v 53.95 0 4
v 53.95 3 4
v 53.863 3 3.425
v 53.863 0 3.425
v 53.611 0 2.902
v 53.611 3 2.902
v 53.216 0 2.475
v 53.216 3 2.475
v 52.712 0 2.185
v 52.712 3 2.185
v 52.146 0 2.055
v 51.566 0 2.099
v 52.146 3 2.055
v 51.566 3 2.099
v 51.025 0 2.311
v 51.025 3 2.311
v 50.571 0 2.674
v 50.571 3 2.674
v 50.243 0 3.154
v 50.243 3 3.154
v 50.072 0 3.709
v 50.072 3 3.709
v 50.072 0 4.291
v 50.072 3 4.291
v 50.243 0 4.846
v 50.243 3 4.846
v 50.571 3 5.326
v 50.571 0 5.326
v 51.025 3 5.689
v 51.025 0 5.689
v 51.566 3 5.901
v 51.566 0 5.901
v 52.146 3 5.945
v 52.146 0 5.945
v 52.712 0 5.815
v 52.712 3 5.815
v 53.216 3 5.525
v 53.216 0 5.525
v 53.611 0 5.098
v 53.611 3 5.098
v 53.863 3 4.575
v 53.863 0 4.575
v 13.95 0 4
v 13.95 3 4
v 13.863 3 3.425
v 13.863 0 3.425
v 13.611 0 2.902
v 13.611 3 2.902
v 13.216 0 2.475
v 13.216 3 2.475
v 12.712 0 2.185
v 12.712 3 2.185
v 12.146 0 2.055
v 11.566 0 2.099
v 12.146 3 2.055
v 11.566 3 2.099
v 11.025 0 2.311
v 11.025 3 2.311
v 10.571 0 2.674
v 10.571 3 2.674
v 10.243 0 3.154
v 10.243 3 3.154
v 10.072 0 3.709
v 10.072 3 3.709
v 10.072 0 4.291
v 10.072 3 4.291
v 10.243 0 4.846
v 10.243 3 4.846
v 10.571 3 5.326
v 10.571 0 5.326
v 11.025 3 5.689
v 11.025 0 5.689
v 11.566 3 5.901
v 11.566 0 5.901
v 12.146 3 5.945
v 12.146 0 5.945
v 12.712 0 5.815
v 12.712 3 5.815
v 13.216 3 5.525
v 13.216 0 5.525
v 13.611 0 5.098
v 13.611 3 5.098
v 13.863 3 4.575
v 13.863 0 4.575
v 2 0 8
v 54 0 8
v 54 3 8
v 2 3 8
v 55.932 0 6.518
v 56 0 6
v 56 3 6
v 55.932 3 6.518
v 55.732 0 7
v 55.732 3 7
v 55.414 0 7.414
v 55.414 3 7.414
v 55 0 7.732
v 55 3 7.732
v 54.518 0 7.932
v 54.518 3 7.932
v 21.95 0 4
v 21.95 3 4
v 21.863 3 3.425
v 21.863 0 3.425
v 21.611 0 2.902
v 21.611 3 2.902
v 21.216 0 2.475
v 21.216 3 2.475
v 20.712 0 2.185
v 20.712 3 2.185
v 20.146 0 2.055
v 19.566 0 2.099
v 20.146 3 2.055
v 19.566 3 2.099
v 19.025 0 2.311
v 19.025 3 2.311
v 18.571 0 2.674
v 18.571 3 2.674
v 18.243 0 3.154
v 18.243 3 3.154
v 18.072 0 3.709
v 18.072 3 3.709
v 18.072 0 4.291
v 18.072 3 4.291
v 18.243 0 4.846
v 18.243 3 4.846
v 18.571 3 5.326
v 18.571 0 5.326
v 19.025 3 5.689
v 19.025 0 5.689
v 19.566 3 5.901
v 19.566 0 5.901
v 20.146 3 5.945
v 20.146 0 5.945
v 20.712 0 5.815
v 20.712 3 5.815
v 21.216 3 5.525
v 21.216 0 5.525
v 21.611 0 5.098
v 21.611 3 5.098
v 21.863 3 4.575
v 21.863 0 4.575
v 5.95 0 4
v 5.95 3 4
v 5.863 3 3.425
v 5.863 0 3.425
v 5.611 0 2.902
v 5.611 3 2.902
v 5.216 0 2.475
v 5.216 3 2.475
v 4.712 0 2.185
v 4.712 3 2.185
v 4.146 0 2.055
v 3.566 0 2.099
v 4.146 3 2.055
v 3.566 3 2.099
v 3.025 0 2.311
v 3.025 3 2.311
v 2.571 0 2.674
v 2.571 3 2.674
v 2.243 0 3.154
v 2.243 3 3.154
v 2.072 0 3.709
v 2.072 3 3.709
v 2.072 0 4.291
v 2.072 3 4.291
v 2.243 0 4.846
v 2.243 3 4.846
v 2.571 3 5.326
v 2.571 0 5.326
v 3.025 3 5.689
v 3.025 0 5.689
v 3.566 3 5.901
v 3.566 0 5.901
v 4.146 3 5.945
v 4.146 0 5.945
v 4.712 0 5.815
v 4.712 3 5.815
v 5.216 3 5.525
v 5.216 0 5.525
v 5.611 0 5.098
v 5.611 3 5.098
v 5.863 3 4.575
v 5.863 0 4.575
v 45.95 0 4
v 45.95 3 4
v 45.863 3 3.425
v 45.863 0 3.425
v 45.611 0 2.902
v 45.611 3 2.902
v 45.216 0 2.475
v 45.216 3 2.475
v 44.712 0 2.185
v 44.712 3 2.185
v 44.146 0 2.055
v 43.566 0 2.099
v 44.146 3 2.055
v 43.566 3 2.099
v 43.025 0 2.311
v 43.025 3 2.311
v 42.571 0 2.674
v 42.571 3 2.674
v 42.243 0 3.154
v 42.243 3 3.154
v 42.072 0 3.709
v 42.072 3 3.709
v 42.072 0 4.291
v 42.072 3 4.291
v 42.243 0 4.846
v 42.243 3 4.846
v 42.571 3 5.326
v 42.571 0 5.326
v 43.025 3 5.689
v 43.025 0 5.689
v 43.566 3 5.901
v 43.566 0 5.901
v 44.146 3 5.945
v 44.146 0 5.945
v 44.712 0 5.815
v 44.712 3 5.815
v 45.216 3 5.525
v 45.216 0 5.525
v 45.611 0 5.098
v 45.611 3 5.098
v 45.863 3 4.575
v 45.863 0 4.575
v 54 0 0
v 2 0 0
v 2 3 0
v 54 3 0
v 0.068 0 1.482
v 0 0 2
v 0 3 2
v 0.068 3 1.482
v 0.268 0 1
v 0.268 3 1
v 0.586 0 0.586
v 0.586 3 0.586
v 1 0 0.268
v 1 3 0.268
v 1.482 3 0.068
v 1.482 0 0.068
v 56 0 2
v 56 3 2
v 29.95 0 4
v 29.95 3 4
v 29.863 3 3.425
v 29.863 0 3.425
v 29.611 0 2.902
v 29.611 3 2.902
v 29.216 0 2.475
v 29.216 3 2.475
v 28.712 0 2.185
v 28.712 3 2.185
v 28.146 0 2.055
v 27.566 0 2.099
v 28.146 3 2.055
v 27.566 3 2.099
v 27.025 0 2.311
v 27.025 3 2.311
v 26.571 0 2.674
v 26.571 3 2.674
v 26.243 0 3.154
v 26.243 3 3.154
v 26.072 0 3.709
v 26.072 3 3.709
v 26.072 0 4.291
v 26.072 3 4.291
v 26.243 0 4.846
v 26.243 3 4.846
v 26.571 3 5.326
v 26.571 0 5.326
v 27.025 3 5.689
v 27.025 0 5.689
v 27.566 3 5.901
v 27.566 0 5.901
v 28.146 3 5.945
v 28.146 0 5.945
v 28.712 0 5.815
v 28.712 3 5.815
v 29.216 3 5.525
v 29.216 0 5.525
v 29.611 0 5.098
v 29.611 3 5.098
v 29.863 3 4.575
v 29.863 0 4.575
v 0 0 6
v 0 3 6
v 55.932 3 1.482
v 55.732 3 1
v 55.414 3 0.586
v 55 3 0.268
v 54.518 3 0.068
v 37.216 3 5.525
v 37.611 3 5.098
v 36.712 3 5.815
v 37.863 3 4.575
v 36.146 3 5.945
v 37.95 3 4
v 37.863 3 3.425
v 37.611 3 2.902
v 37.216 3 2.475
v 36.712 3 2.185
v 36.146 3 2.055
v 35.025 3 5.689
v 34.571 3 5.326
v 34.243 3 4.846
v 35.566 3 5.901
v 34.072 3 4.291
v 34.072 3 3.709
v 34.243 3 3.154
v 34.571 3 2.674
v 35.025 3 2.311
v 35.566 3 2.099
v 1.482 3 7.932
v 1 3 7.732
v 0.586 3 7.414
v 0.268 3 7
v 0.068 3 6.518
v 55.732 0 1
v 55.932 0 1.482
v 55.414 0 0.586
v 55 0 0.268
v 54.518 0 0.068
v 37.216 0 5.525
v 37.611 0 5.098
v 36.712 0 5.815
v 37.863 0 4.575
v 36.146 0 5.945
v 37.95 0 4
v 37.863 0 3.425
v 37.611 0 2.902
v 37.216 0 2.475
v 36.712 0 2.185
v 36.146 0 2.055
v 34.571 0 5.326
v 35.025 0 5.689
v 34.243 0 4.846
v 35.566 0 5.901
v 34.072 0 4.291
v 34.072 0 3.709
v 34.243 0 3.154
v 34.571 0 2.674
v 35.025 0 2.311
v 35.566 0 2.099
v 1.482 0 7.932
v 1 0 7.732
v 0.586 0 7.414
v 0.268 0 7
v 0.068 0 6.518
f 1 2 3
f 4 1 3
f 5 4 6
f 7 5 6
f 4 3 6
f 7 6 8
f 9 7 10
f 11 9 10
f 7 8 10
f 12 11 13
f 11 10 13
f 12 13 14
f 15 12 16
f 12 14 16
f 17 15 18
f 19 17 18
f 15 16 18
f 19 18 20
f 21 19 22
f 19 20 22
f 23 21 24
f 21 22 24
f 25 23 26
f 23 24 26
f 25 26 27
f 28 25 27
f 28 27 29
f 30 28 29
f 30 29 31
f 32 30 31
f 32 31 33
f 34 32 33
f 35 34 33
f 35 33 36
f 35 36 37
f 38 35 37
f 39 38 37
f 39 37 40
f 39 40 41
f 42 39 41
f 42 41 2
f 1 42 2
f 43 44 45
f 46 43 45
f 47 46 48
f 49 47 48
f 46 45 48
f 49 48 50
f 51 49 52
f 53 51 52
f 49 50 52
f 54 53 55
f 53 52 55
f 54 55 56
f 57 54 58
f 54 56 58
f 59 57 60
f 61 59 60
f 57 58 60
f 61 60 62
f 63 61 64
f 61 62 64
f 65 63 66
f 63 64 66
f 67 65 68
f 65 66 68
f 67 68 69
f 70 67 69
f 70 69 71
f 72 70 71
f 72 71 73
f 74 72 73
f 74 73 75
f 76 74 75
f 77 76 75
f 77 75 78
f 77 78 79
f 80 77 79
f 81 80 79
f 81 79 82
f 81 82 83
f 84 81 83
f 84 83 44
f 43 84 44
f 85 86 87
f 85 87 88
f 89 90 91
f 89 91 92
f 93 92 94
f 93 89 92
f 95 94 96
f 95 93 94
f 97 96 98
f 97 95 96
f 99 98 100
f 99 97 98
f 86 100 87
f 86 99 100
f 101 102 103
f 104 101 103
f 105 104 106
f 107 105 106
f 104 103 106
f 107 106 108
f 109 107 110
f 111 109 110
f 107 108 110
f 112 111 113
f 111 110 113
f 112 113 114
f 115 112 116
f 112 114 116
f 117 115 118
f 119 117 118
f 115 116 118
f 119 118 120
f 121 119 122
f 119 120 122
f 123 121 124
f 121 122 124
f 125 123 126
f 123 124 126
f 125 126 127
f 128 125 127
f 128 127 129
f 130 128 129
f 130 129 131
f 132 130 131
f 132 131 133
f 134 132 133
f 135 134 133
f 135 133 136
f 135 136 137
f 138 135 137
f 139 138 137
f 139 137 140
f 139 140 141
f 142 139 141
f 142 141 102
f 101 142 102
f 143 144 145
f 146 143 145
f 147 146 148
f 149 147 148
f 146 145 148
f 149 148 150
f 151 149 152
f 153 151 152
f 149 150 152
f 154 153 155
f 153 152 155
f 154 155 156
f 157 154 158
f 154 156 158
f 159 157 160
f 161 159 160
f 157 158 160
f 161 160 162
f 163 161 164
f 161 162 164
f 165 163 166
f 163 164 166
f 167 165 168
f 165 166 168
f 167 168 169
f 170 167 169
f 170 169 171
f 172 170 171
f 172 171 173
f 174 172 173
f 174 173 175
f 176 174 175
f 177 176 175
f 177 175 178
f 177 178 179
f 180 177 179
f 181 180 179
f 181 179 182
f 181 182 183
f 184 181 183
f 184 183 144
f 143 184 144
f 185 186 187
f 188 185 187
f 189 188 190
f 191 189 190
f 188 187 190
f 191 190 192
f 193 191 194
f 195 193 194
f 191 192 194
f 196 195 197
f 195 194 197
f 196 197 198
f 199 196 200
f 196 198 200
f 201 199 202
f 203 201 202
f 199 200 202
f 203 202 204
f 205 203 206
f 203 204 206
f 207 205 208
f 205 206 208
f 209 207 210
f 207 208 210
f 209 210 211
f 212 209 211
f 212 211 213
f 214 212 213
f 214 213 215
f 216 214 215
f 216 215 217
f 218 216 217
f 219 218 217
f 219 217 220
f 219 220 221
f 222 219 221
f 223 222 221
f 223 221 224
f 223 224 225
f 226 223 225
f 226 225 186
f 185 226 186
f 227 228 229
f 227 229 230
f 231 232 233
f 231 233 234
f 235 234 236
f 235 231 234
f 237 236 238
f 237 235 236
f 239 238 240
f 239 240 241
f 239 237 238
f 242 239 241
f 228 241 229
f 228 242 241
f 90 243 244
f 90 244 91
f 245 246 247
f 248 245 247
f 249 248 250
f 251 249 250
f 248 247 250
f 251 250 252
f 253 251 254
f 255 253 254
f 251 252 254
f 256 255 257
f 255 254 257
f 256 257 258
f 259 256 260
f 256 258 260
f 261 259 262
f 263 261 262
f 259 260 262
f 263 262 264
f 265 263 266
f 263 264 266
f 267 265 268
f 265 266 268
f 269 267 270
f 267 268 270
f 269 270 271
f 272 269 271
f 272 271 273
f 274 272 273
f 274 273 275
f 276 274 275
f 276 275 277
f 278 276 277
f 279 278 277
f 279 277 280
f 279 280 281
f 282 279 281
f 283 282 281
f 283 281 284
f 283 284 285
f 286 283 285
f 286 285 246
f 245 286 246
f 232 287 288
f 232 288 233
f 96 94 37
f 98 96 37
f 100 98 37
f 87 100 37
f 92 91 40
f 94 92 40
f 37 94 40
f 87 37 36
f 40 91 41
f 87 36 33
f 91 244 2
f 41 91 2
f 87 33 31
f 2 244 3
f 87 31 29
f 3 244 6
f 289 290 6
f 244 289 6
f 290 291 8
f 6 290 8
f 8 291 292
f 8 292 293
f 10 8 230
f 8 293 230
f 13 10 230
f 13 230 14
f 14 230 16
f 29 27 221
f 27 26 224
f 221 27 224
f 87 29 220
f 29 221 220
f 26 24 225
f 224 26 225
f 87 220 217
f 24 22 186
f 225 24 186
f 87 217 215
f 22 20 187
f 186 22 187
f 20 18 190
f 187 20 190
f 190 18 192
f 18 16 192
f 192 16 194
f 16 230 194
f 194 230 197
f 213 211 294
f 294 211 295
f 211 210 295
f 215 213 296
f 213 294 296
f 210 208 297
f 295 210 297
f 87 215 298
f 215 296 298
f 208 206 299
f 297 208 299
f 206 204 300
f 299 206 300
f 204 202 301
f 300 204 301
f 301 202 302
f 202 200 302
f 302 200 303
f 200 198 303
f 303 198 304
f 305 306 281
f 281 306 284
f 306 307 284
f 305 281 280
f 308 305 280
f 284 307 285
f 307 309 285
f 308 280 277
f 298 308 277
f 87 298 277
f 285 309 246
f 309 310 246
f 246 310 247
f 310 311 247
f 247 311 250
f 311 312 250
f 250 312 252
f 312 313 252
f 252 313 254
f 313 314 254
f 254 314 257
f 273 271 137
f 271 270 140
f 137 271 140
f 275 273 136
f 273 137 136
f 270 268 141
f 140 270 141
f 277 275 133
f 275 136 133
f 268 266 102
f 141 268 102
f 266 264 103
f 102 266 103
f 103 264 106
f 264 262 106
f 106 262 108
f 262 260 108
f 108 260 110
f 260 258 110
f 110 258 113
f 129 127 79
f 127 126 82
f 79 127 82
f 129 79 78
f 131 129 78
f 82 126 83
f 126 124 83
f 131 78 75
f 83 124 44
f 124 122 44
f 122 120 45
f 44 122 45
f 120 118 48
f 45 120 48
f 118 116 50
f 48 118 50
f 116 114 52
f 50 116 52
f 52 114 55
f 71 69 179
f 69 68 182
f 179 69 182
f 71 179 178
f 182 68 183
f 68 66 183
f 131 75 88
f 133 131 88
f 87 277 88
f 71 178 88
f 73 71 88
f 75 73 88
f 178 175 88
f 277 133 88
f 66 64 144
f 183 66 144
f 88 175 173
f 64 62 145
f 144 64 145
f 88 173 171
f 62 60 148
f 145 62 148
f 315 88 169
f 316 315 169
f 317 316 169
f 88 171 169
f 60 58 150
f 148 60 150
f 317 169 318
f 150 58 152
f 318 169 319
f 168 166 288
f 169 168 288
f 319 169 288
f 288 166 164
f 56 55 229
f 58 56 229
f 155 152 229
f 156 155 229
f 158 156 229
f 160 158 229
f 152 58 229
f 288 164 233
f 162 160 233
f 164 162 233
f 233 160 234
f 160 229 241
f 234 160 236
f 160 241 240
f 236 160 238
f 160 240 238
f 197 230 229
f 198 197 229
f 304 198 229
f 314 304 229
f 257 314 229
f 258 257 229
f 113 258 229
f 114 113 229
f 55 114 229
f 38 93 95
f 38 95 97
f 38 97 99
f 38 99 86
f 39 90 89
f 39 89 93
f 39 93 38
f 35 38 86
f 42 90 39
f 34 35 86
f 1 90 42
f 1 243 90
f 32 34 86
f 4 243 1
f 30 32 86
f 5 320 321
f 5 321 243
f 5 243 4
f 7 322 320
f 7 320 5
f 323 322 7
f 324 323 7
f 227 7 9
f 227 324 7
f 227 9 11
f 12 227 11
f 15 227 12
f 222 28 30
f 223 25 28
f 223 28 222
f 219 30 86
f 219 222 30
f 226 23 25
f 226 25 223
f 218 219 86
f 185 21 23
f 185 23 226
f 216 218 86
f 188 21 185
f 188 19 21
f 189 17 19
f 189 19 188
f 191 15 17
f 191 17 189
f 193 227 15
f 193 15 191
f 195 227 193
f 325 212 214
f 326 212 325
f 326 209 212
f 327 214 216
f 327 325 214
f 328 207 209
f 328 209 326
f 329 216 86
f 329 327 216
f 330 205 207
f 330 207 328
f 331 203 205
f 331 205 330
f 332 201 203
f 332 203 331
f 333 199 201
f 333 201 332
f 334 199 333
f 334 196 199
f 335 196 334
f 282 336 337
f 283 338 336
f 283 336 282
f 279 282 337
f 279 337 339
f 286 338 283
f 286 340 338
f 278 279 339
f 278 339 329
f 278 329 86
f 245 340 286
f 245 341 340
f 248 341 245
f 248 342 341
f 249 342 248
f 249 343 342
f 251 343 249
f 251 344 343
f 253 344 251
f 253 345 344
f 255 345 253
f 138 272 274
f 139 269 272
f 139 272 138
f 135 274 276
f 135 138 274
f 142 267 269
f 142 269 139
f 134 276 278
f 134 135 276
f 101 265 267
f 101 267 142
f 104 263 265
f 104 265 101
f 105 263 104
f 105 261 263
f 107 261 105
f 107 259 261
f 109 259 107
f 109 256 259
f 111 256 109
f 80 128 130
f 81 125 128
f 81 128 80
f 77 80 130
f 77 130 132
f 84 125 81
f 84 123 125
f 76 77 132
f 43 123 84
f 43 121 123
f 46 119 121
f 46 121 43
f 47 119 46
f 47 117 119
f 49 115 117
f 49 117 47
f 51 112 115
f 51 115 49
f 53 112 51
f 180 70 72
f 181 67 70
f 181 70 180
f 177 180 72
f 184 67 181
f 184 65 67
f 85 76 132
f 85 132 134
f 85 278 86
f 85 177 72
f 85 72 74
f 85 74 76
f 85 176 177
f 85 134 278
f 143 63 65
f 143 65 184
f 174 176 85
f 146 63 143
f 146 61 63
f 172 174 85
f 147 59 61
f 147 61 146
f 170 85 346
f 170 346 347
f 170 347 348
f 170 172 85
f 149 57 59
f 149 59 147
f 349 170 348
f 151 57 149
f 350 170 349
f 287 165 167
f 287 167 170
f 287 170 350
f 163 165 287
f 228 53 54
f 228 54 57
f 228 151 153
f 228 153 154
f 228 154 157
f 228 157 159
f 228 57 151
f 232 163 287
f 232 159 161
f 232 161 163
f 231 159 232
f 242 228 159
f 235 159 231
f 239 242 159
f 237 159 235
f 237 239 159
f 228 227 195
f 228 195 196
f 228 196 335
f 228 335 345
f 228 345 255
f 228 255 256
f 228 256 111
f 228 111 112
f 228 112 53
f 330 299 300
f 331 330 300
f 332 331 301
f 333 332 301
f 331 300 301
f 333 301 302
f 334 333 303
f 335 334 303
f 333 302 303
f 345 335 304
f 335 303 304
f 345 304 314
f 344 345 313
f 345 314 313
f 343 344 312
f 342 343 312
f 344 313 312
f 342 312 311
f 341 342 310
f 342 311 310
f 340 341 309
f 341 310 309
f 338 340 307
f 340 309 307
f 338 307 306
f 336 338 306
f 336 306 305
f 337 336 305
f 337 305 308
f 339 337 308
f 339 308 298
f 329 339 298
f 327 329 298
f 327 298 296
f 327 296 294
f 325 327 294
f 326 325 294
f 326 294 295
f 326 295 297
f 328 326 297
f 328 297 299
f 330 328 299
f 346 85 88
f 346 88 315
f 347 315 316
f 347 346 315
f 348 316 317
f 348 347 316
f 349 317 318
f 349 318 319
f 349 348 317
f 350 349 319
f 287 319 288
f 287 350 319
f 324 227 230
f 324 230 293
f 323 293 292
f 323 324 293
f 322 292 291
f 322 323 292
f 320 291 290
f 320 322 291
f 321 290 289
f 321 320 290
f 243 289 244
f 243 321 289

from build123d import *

# Parameters (mm, degrees)
BOSS_EXTRUDE1_DEPTH = 3
SKETCH2_R           = 1.95
CUT_EXTRUDE1_DEPTH  = 4


with BuildPart() as part:
    # Sketch1 → Boss-Extrude1 (new body)
    with BuildSketch(Plane(origin=(0, 0, 0), x_dir=(1, 0, 0), z_dir=(0, 1, 0))):
        with BuildLine():
            Line((2, 0), (54, 0))
            ThreePointArc((54, 0), (55.414213562, -0.585786438), (56, -2))
            Line((56, -2), (56, -6))
            ThreePointArc((56, -6), (55.414213562, -7.414213562), (54, -8))
            Line((54, -8), (2, -8))
            ThreePointArc((2, -8), (0.585786438, -7.414213562), (0, -6))
            Line((0, -6), (0, -2))
            ThreePointArc((0, -2), (0.585786438, -0.585786438), (2, 0))
        make_face()
    extrude(amount=BOSS_EXTRUDE1_DEPTH)

    # Sketch2 → Cut-Extrude1 (cut, through all)
    with BuildSketch(Plane(origin=(0, 3, 0), x_dir=(1, 0, 0), z_dir=(0, 1, 0))):
        with Locations((52, -4)):
            Circle(SKETCH2_R)
        with Locations((44, -4)):
            Circle(SKETCH2_R)
        with Locations((-12, -4)):
            Circle(SKETCH2_R)
        with Locations((-4, -4)):
            Circle(SKETCH2_R)
        with Locations((4, -4)):
            Circle(SKETCH2_R)
        with Locations((12, -4)):
            Circle(SKETCH2_R)
        with Locations((20, -4)):
            Circle(SKETCH2_R)
        with Locations((28, -4)):
            Circle(SKETCH2_R)
        with Locations((36, -4)):
            Circle(SKETCH2_R)
    extrude(amount=-CUT_EXTRUDE1_DEPTH, mode=Mode.SUBTRACT)


solid = part.part
